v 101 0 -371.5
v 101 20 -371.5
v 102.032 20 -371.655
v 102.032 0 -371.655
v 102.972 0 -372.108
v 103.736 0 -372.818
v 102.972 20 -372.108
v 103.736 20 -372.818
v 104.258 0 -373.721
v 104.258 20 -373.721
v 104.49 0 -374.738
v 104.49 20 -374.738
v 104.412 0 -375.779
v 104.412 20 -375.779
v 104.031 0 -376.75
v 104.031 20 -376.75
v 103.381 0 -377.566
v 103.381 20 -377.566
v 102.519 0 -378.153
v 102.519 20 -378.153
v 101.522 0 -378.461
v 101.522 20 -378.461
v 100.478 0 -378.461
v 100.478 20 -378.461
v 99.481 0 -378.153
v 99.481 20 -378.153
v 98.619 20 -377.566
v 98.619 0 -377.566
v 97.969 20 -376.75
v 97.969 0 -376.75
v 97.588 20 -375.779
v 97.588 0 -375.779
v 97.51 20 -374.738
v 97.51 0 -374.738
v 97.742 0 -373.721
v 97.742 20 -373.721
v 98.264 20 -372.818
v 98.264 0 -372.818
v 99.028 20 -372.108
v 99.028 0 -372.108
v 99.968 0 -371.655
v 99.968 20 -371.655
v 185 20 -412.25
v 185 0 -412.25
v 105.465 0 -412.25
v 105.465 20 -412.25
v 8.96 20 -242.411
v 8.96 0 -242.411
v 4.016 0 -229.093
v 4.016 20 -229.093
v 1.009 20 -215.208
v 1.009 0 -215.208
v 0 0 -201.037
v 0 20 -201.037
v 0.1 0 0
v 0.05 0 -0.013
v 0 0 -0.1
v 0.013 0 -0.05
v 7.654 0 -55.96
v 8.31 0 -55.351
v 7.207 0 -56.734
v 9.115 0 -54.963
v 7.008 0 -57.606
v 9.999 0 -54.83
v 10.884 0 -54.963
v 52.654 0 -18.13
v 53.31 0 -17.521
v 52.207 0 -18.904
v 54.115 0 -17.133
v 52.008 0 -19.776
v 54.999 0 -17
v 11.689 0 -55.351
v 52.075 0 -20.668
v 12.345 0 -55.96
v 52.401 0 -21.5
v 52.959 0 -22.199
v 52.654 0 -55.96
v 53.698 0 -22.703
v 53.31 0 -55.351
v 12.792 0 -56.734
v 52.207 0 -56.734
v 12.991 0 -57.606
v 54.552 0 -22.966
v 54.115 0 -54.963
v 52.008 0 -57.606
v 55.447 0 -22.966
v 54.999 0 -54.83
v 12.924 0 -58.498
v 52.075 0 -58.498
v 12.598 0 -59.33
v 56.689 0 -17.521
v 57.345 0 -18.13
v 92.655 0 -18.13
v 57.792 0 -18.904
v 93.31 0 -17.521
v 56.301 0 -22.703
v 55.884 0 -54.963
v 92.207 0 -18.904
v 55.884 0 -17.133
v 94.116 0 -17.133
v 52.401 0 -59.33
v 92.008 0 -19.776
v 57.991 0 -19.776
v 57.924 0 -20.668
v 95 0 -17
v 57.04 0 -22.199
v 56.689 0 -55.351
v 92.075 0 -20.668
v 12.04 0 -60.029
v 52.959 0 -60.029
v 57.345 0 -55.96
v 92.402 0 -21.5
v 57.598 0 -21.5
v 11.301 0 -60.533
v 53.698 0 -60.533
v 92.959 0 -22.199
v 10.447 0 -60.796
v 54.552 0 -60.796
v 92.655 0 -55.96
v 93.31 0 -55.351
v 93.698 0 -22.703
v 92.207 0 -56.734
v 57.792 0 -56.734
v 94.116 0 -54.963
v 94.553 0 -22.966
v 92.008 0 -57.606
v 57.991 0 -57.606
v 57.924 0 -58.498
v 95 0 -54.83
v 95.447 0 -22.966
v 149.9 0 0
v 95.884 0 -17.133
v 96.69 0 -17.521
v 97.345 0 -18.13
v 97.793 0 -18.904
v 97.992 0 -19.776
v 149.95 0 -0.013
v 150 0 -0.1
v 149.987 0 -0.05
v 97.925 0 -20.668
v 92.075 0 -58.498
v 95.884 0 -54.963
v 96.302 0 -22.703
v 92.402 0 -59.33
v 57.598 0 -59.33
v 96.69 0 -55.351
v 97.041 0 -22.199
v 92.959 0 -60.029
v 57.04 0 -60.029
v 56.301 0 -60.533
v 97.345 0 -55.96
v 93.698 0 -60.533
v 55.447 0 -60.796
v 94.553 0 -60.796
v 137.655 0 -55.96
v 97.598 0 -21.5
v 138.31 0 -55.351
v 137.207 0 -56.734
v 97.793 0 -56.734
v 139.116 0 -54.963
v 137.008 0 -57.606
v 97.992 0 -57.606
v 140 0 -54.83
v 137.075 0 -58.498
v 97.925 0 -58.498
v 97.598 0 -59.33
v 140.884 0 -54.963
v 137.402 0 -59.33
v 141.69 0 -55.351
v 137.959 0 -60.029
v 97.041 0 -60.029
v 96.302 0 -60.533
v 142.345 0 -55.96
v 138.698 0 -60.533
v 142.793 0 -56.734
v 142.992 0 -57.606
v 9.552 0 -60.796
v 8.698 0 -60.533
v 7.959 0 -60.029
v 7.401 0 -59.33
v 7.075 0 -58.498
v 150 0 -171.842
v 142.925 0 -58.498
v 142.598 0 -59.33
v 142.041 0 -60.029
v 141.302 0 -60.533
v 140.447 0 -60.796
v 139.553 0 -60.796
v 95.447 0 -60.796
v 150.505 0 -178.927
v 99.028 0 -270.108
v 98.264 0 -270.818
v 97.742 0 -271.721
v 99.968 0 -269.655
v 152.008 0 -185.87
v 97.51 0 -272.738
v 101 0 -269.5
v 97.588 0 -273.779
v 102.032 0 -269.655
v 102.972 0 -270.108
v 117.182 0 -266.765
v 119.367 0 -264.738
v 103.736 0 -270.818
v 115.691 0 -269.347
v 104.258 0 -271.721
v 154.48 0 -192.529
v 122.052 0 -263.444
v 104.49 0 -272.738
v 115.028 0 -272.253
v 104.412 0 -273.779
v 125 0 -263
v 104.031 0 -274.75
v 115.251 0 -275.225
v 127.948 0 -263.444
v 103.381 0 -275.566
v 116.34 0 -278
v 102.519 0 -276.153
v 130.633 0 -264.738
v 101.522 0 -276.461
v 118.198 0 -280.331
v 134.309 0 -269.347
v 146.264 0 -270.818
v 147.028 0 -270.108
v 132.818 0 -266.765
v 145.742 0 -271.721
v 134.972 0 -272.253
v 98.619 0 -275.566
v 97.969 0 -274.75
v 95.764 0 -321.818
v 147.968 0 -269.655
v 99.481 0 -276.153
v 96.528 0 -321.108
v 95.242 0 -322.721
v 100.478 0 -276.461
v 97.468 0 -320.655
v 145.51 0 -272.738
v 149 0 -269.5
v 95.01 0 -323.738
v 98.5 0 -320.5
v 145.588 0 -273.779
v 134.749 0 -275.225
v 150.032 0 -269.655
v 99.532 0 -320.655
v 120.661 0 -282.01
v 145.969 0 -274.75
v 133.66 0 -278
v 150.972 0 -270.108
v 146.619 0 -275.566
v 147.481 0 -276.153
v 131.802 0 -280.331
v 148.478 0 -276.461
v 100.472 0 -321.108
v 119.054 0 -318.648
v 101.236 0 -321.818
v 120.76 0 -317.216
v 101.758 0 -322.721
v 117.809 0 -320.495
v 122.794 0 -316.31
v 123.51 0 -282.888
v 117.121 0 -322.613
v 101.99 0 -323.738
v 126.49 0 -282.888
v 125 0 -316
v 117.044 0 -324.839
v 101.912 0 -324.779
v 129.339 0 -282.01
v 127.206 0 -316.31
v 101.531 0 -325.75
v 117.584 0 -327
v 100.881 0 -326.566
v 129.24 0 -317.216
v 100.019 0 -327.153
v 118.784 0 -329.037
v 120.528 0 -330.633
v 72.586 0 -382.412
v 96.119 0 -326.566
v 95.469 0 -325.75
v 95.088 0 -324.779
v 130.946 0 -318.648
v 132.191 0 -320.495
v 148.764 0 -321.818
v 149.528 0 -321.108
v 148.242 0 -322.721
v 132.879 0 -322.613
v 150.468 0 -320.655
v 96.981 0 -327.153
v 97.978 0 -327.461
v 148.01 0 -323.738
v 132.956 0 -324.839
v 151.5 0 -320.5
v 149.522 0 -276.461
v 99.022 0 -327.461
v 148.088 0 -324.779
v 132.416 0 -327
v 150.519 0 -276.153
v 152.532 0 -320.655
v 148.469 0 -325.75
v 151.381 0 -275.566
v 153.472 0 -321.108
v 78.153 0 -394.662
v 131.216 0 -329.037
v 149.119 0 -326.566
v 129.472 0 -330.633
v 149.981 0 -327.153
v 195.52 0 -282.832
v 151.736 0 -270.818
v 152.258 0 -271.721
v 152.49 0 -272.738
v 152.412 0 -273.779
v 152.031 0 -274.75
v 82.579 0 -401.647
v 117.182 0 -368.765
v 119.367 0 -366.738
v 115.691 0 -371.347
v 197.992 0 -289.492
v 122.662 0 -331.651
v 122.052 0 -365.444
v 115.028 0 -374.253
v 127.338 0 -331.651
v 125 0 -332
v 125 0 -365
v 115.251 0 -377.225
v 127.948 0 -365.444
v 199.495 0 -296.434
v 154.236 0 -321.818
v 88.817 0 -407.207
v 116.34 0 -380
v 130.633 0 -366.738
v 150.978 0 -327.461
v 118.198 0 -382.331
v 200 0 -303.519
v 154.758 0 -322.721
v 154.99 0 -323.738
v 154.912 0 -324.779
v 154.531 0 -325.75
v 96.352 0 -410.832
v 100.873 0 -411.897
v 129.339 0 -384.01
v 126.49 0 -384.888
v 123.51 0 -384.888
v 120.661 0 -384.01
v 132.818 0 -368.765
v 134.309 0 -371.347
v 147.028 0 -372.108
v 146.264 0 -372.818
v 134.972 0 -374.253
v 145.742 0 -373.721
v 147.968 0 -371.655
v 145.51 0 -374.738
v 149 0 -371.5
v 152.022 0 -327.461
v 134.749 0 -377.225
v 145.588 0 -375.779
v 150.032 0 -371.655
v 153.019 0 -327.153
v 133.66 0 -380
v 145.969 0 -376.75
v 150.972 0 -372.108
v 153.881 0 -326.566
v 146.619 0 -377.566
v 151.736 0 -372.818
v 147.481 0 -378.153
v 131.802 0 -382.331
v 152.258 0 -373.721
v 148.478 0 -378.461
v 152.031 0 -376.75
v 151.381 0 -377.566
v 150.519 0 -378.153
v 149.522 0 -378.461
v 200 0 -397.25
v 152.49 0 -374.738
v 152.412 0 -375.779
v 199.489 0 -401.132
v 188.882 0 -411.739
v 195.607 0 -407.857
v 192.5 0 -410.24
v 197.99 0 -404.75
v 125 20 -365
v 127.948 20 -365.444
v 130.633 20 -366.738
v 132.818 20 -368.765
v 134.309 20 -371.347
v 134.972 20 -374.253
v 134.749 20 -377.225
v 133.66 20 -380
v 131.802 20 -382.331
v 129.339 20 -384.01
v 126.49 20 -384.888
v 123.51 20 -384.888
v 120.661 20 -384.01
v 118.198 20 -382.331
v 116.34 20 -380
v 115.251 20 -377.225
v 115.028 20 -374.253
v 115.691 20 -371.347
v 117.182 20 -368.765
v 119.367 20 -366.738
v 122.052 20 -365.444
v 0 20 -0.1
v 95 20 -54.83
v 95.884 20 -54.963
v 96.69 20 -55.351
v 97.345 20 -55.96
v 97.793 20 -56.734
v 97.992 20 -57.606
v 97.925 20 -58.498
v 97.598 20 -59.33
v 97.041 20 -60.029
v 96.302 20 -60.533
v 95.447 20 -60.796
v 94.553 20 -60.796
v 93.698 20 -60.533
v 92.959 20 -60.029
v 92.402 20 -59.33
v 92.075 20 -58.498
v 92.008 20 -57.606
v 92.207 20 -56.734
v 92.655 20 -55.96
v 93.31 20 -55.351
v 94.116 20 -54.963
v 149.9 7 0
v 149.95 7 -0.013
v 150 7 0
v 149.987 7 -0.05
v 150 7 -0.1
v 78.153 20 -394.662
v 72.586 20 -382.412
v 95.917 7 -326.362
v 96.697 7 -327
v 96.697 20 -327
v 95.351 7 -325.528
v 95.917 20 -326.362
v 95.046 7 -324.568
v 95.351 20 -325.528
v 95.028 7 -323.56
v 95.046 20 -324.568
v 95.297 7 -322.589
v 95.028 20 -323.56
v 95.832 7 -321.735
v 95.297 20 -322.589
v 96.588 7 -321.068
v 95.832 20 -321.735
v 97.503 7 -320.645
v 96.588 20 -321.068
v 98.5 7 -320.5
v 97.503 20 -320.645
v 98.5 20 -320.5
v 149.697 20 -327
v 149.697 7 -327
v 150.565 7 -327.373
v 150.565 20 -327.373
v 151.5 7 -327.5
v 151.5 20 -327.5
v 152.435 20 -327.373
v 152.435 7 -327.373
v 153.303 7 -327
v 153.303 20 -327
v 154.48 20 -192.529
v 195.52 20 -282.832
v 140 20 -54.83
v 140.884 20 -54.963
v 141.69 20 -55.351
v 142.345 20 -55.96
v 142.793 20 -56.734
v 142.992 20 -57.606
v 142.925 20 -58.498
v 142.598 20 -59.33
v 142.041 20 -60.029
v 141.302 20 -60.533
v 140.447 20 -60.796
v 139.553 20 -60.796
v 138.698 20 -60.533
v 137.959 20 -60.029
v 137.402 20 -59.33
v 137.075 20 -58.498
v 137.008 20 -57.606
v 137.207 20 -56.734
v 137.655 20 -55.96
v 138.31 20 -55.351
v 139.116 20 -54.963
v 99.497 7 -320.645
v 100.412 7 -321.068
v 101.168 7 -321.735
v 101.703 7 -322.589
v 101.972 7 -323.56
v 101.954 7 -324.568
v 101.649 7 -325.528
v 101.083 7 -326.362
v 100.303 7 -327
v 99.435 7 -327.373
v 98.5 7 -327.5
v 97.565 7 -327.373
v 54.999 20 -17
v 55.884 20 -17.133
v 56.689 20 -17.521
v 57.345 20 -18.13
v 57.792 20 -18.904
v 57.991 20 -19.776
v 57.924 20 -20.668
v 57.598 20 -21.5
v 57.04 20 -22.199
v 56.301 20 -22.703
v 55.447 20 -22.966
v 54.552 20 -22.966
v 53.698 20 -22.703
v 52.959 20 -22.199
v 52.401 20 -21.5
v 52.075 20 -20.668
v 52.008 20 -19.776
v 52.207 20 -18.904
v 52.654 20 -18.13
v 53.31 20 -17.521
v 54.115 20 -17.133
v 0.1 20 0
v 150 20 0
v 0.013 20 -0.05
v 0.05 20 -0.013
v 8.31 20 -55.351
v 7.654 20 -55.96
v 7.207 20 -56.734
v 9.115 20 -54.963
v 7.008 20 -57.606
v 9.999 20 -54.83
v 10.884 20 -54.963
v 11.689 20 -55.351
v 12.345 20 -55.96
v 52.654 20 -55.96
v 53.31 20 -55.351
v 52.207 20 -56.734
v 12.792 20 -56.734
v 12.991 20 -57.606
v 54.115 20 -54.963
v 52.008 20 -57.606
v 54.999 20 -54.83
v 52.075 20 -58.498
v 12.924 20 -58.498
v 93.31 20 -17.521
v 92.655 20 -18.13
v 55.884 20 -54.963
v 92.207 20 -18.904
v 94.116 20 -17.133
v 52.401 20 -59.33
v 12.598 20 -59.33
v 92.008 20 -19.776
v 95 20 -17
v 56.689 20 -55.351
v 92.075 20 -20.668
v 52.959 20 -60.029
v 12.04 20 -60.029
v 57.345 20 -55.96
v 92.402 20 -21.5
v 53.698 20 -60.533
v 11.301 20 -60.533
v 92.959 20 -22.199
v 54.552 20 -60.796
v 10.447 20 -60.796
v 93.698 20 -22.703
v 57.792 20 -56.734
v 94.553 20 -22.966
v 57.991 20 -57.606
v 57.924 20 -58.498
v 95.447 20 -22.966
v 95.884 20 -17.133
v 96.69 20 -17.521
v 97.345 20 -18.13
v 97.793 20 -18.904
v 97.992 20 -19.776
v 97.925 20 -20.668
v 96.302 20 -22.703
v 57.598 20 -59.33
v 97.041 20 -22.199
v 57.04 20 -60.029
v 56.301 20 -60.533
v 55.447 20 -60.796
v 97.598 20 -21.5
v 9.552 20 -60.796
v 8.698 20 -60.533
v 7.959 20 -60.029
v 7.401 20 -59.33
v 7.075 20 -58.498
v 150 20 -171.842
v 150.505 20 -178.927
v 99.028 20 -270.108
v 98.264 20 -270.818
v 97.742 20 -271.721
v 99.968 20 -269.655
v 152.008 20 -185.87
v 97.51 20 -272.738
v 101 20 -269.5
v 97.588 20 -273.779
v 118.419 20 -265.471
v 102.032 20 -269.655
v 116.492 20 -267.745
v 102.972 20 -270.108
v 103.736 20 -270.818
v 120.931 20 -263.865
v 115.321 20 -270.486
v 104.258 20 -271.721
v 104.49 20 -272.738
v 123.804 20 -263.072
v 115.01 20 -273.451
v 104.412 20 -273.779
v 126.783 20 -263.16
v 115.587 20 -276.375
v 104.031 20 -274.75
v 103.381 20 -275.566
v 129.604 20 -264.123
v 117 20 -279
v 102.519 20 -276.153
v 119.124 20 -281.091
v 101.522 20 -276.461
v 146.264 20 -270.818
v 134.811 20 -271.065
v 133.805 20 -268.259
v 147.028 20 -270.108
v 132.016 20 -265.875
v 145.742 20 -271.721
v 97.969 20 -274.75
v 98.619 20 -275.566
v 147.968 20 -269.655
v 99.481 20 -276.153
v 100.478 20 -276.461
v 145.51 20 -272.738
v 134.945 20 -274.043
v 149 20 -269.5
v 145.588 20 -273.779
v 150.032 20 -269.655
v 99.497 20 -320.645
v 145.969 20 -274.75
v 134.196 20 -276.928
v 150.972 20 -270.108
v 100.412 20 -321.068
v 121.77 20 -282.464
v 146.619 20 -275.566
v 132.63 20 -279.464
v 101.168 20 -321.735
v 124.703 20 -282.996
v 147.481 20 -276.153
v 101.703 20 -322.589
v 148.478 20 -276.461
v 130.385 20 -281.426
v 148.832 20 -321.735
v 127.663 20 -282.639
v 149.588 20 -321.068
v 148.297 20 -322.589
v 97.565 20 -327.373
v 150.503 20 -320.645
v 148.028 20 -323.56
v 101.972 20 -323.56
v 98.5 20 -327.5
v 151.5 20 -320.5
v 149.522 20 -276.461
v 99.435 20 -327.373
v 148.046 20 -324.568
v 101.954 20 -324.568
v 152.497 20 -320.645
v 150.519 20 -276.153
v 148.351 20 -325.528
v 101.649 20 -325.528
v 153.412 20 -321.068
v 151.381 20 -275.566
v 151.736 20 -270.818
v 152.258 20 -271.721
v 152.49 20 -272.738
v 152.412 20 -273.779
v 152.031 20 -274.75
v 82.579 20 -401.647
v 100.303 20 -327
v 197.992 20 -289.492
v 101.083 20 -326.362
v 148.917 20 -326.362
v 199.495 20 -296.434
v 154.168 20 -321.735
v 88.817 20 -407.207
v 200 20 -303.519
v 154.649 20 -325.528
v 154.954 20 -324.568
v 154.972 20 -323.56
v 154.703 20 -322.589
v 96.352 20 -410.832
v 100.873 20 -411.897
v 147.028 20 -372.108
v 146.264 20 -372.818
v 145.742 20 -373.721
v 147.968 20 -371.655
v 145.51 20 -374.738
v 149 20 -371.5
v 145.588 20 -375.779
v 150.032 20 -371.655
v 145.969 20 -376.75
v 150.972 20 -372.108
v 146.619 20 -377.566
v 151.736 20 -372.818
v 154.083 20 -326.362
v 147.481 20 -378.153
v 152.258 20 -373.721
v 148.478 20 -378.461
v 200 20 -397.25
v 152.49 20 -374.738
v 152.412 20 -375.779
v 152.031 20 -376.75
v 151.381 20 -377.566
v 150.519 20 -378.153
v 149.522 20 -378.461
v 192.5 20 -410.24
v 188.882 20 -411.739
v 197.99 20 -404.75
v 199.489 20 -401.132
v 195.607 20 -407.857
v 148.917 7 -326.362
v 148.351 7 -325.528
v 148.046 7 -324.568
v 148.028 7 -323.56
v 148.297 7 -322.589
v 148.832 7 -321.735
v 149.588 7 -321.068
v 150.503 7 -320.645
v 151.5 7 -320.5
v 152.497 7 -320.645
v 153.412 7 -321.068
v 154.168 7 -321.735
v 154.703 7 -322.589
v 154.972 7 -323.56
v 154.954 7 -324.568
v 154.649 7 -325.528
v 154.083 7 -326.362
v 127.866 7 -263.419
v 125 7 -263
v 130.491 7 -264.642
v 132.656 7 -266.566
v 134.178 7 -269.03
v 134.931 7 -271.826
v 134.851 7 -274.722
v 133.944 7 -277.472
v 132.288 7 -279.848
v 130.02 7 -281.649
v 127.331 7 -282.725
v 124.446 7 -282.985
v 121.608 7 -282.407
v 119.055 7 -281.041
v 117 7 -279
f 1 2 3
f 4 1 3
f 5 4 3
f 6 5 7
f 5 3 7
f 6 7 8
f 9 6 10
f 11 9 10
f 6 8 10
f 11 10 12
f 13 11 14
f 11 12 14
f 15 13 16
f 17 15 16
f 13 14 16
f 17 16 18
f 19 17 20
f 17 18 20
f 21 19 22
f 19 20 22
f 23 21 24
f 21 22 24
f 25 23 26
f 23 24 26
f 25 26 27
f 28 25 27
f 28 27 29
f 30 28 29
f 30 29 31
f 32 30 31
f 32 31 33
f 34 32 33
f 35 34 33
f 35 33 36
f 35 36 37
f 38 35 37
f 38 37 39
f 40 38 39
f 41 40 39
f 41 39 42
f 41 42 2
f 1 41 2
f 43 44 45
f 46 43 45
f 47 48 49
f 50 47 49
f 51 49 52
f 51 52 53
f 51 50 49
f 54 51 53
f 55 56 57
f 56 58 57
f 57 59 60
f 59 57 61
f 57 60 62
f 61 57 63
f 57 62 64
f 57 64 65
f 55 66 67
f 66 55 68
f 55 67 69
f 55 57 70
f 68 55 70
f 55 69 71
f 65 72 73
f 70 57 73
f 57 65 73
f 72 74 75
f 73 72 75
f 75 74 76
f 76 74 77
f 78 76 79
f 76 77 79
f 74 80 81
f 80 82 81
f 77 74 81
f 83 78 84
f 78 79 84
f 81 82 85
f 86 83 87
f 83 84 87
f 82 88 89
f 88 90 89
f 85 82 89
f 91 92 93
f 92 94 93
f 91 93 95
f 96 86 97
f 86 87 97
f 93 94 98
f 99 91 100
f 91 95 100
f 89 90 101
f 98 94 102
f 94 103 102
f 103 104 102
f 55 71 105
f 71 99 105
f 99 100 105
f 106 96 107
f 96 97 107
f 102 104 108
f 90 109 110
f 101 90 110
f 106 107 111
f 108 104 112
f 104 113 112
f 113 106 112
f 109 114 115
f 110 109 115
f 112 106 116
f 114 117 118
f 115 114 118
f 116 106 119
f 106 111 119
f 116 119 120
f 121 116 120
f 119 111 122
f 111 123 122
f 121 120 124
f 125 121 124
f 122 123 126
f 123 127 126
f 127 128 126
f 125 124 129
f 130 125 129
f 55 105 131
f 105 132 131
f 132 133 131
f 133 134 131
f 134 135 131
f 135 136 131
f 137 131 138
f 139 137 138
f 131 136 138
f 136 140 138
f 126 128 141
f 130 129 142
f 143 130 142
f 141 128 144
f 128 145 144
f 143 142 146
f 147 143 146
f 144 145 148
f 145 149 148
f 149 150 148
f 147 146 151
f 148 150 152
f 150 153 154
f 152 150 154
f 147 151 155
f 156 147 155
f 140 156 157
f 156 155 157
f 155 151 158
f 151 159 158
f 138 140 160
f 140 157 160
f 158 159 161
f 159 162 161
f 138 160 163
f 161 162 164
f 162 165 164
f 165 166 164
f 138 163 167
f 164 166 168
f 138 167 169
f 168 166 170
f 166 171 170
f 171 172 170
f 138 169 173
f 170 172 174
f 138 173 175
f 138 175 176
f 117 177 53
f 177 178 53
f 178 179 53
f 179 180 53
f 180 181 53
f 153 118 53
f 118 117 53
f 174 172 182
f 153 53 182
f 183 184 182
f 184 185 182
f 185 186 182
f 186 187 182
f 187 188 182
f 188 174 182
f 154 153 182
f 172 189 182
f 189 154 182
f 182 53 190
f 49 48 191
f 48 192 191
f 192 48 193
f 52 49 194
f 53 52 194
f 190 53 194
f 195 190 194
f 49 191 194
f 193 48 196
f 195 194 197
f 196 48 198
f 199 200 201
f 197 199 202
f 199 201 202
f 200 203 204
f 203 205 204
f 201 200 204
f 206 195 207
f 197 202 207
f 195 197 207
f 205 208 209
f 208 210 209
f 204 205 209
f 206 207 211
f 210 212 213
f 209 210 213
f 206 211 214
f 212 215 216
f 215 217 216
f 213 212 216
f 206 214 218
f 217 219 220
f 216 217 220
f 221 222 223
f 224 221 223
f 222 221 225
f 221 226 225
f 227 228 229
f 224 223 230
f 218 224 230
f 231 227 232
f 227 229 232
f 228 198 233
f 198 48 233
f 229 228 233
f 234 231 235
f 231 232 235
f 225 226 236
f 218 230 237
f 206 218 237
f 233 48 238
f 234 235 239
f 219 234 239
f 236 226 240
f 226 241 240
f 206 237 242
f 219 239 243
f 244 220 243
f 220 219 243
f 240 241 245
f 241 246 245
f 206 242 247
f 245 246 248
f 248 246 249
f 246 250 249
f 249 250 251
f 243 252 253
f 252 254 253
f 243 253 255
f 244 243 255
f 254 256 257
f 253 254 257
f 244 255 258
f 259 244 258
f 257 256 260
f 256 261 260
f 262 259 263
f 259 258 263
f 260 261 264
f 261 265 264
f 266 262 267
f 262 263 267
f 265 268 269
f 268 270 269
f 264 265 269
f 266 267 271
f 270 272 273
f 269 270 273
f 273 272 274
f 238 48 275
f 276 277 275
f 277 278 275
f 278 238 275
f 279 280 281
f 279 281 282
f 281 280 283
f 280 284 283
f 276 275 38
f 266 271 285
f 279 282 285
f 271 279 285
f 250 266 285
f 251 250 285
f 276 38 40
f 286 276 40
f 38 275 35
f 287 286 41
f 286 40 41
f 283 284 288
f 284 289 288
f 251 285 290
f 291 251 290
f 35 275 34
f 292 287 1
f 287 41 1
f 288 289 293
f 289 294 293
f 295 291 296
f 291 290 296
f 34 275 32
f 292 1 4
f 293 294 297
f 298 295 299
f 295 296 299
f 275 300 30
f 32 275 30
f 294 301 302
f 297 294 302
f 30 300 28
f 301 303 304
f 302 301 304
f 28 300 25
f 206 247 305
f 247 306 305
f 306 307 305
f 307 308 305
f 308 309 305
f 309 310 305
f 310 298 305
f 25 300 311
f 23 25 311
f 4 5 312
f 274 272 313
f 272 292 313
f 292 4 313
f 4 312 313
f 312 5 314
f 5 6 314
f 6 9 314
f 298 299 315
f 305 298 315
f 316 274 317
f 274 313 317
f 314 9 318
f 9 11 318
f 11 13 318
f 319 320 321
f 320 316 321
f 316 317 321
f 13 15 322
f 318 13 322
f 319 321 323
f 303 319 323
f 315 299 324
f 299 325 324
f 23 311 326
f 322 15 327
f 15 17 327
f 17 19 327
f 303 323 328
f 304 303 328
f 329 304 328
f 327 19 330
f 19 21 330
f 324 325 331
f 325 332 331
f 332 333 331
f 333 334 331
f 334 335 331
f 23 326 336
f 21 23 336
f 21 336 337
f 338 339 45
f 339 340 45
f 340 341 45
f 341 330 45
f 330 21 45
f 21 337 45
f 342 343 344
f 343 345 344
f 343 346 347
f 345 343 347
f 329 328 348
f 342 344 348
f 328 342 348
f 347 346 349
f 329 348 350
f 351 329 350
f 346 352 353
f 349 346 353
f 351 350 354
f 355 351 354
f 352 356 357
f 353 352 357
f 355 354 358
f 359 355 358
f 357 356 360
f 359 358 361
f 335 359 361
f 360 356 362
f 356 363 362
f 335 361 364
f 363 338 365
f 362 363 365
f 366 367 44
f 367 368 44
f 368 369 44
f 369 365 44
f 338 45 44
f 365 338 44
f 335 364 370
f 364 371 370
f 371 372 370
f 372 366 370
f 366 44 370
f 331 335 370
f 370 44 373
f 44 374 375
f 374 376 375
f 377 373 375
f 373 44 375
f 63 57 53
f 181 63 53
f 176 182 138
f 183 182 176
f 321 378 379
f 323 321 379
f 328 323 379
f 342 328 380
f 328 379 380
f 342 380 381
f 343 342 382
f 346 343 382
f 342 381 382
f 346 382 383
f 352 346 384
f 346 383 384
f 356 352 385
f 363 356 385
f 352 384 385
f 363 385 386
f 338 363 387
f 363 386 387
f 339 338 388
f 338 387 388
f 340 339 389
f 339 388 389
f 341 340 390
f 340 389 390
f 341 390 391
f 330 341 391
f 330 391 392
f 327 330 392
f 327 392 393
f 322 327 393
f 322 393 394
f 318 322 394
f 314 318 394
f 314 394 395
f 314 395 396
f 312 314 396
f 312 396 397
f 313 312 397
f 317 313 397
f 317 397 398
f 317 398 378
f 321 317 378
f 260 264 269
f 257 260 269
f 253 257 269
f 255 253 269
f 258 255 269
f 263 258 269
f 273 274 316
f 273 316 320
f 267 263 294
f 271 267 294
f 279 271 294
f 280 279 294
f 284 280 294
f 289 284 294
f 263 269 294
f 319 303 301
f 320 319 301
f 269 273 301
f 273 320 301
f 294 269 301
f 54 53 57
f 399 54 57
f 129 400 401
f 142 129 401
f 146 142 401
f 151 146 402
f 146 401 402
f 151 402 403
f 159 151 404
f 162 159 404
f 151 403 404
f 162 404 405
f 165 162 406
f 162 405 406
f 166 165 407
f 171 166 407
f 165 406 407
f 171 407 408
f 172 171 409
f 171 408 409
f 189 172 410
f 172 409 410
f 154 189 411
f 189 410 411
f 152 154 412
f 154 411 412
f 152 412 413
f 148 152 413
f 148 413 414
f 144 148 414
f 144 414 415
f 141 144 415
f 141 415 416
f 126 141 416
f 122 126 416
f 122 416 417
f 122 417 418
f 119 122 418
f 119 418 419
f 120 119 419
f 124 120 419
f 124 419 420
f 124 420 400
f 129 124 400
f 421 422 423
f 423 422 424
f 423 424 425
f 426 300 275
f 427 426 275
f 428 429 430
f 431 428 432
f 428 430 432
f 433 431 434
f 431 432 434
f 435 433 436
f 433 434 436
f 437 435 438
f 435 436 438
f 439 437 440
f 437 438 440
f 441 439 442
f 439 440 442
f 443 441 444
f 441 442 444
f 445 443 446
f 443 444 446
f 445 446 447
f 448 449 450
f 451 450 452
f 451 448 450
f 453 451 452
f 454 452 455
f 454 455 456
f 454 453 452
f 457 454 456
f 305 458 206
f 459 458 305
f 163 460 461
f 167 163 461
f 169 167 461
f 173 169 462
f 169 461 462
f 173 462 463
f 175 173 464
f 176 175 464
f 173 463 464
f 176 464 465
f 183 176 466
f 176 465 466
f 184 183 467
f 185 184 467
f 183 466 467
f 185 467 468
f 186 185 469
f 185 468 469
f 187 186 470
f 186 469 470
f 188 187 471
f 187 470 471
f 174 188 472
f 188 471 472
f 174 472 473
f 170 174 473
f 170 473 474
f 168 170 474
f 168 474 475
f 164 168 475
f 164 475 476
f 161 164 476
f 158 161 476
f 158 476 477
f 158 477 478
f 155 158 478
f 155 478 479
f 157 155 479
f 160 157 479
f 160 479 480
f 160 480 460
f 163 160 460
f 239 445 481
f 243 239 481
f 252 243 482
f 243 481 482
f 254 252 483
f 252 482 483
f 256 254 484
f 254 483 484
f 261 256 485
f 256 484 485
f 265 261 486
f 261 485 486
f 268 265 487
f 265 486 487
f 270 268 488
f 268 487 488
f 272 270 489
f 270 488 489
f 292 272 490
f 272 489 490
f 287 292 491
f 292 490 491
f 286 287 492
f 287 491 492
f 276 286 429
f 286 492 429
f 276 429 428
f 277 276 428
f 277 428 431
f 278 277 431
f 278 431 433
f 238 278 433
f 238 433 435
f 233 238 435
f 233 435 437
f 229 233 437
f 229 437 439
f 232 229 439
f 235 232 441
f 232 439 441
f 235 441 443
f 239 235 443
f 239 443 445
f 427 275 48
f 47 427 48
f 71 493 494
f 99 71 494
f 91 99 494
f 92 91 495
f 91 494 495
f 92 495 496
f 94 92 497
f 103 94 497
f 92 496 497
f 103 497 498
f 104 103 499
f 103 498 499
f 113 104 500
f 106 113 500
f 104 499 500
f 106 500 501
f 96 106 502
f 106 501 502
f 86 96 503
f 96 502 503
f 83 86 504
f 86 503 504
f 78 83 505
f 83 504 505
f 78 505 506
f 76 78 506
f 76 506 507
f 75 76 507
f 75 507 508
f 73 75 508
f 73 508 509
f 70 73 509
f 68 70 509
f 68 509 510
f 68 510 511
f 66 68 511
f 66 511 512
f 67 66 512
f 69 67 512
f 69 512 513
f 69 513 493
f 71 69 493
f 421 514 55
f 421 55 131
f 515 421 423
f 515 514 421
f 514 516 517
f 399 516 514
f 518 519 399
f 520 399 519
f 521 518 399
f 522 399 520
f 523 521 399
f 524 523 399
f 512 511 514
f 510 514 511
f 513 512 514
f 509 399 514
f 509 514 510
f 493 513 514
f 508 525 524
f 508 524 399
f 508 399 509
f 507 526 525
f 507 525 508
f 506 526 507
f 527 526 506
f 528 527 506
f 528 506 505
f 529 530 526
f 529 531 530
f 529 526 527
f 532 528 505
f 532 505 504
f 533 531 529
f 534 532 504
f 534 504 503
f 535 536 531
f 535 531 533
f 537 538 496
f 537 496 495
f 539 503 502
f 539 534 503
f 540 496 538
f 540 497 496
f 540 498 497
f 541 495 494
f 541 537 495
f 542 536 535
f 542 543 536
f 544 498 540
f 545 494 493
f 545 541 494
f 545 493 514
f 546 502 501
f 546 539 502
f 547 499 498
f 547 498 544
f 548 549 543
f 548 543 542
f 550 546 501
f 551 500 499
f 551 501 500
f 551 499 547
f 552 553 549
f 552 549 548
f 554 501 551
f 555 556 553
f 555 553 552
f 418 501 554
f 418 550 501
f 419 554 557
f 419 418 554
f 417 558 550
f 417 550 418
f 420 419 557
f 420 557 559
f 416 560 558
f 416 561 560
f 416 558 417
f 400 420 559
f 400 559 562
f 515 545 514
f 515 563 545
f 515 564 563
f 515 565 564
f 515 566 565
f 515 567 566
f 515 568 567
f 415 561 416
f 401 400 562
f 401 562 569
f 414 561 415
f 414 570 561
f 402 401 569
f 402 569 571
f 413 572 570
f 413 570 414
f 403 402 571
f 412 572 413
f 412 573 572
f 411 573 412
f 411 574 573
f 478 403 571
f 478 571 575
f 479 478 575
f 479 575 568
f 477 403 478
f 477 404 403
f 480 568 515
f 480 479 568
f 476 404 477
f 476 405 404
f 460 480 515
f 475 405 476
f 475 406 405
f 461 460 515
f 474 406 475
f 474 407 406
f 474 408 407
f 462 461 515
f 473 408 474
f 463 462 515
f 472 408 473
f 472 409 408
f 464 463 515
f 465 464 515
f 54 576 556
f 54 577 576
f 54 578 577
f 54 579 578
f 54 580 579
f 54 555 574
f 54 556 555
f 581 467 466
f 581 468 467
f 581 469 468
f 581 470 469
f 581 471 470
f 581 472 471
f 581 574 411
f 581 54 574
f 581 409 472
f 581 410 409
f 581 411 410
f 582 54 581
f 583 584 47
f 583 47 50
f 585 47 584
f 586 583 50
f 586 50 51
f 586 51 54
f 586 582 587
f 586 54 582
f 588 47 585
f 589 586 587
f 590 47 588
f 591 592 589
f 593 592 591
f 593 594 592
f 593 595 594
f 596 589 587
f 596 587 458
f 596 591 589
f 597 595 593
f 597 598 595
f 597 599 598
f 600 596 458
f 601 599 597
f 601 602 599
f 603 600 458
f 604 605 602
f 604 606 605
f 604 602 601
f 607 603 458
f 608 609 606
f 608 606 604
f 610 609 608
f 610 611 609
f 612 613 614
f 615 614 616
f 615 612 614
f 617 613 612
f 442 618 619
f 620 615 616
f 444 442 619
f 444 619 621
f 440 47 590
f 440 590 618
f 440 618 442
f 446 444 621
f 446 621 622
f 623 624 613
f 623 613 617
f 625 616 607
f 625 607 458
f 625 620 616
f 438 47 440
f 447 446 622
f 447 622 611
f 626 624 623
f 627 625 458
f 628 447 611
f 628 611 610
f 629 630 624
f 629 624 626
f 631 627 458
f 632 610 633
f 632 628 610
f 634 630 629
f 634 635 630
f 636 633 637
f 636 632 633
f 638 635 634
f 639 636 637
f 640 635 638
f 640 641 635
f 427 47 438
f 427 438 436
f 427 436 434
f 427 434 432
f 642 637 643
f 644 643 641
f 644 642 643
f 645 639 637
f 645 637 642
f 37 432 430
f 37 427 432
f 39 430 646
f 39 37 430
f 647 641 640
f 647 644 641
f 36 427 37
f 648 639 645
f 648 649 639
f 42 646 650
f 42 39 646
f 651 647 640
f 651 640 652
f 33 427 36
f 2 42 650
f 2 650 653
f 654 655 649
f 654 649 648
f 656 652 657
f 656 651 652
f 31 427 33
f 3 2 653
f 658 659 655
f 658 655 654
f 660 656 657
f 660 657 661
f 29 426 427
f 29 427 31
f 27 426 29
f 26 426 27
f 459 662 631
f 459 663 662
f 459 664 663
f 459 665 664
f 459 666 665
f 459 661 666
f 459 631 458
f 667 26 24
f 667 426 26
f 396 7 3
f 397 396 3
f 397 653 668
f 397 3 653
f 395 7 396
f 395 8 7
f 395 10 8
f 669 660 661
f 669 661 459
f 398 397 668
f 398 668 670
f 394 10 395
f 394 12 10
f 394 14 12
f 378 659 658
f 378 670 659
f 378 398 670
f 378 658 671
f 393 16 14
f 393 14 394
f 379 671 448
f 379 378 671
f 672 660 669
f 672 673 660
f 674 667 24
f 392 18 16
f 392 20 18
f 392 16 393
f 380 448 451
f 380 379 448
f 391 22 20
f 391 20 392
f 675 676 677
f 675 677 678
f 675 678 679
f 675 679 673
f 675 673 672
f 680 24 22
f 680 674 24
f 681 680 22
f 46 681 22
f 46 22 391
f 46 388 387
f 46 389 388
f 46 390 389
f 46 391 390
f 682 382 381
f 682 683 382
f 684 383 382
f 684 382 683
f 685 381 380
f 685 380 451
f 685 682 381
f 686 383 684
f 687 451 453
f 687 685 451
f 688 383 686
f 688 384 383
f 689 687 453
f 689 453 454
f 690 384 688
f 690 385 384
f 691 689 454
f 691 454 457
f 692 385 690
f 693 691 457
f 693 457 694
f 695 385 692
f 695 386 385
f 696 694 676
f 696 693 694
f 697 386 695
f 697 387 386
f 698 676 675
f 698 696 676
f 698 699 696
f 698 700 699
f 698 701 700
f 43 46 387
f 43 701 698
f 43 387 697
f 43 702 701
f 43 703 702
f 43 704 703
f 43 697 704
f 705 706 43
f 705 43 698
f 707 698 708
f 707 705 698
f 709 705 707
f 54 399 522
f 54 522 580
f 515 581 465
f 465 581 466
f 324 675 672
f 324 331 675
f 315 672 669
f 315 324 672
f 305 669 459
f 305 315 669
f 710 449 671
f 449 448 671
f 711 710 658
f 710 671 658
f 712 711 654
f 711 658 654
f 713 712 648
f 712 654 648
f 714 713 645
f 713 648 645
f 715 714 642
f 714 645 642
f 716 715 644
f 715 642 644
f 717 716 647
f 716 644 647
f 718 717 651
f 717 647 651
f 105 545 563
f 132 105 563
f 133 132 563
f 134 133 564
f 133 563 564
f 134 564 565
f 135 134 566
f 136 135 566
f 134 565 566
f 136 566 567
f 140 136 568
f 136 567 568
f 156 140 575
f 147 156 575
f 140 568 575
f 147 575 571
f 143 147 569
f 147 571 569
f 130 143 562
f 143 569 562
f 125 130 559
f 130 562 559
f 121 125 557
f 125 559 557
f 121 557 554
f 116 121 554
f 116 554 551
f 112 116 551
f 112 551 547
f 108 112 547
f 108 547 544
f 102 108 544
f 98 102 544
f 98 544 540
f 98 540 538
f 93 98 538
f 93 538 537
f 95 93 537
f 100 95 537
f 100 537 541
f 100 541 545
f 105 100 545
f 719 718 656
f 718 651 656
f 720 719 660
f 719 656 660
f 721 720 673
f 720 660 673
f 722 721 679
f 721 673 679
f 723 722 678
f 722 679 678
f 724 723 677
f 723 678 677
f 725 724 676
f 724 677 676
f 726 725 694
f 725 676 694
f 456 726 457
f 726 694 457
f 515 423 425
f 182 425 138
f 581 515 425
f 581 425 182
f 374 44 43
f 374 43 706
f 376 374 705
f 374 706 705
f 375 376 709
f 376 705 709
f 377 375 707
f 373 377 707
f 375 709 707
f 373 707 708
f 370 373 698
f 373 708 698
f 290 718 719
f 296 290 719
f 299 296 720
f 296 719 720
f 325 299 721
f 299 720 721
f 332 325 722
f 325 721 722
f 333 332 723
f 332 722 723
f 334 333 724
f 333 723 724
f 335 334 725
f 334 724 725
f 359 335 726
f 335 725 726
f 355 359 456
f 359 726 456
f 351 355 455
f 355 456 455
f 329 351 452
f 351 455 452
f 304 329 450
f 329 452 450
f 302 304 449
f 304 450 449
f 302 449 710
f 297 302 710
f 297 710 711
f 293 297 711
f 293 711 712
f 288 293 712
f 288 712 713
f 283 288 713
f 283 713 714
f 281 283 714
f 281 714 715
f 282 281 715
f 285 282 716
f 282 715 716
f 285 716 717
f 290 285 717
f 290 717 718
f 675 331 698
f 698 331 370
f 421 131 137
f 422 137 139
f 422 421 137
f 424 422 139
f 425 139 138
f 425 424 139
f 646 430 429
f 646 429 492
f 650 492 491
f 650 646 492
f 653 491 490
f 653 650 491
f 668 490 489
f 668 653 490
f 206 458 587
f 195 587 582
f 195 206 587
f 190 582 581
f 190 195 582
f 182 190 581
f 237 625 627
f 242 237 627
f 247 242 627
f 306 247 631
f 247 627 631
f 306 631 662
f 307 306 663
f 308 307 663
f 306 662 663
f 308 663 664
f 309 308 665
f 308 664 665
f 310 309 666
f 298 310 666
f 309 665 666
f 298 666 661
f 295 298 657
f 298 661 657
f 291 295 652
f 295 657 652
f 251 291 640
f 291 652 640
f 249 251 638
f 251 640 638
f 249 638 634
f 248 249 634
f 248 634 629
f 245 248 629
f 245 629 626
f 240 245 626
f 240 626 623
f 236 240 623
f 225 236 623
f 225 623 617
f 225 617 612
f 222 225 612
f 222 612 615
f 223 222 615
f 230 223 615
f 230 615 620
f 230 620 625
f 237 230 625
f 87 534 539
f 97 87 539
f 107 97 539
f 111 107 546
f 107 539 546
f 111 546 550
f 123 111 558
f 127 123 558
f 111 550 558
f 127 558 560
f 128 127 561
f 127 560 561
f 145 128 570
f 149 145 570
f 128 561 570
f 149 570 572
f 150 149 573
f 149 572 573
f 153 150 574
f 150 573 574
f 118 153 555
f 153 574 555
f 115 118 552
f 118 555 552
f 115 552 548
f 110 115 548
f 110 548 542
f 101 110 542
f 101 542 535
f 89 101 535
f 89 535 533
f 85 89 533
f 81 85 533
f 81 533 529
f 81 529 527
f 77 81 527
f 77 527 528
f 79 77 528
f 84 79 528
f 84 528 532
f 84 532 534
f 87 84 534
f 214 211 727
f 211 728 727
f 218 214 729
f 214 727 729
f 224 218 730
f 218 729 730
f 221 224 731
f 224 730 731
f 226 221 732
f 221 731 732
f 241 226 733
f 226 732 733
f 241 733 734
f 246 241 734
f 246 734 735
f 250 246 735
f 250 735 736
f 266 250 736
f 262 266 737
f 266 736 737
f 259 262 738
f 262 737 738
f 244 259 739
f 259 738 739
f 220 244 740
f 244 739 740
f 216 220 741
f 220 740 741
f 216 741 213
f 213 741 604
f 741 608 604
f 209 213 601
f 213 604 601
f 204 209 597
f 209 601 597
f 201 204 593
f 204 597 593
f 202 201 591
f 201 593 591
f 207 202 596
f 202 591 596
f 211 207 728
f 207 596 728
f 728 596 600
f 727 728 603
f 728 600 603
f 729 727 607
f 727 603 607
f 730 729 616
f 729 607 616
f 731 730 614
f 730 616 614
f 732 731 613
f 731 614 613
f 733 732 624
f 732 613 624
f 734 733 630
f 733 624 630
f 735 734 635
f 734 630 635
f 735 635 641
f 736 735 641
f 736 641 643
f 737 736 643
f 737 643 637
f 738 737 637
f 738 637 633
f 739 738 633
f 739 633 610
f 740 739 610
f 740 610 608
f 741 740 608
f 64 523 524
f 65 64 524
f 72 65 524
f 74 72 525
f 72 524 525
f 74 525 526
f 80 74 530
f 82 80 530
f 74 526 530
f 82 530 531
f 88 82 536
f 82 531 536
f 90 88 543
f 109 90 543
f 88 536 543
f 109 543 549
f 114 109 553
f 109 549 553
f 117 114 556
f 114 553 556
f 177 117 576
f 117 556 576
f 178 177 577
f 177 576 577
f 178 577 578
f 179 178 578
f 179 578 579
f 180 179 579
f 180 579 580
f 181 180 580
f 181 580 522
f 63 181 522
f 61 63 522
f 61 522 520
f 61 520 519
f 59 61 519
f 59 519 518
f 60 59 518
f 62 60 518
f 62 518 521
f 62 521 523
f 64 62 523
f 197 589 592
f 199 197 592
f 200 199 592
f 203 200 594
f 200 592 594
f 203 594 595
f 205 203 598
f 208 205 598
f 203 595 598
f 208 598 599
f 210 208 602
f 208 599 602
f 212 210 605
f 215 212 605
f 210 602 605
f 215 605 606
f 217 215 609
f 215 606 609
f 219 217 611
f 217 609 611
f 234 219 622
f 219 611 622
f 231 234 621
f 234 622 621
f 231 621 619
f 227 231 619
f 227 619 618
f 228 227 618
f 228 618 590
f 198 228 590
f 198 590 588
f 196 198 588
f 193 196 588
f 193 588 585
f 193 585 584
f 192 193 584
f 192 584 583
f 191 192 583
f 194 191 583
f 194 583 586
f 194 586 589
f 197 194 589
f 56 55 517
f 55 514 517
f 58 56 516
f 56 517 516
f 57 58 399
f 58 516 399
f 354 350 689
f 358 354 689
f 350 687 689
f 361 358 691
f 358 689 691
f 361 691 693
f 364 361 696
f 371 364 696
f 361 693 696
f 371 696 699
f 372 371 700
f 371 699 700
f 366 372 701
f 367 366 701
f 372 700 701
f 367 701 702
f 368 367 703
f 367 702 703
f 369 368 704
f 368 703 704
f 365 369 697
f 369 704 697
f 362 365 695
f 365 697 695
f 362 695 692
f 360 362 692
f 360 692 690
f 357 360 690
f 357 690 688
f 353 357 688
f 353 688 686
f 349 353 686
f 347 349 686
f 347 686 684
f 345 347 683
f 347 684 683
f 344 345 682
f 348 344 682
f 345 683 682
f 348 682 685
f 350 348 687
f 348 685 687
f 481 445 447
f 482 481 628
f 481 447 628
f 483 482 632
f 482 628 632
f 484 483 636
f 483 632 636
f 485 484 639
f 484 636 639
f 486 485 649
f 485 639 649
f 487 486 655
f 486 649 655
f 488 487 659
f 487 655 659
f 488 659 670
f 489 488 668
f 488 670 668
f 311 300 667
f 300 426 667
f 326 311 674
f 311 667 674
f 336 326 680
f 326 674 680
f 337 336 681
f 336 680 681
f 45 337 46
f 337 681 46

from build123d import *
from build123d.topology import SkipClean

# Parameters (mm, degrees)
BOSS_EXTRUDE1_DEPTH  = 20
FILLET1_R            = 15
FILLET3_R            = 30
FILLET4_R            = 100
CUT_EXTRUDE1_DEPTH   = 20
FILLET6_R            = 50
FILLET7_R            = 50
FILLET9_R            = 0.1
FILLET10_R           = 0.1
SKETCH3_R            = 3
CUT_EXTRUDE2_DEPTH   = 13
SKETCH4_R            = 8
SKETCH4_R_2          = 10
CUT_EXTRUDE3_DEPTH   = 30
SKETCH5_R            = 3.5
CUT_EXTRUDE4_DEPTH   = 13
SKETCH6_R            = 3.5
CUT_EXTRUDE5_DEPTH   = 13
SKETCH7_R            = 3
BOSS_EXTRUDE2_DEPTH  = 13
SKETCH8_R            = 3
BOSS_EXTRUDE3_DEPTH  = 13
SKETCH9_R            = 8
SKETCH9_R_2          = 3.5
SKETCH9_R_3          = 10
CUT_EXTRUDE6_DEPTH   = 13
SKETCH10_R           = 3.5
BOSS_EXTRUDE4_DEPTH  = 13
SKETCH12_W           = 149.9
SKETCH12_H           = 13
CUT_EXTRUDE9_DEPTH   = 70
SKETCH13_R           = 3
CUT_EXTRUDE12_DEPTH  = 60
SKETCH16_R           = 8
SKETCH16_R_2         = 3.5
SKETCH16_R_3         = 10
CUT_EXTRUDE14_DEPTH  = 60
BOSS_EXTRUDE5_START  = -7
BOSS_EXTRUDE5_DEPTH  = 7
SKETCH18_W           = 85.102461965
SKETCH18_H           = 20
BOSS_EXTRUDE6_DEPTH  = 2.25
BOSS_EXTRUDE7_DEPTH  = 20
FILLET11_R           = 30
FILLET12_R           = 15
BOSS_EXTRUDE9_START  = -20
BOSS_EXTRUDE9_DEPTH  = 20
FILLET13_R           = 30
FILLET14_R           = 15
SKETCH21_R           = 8
BOSS_EXTRUDE10_DEPTH = 20


with BuildPart() as part:
    # Sketch1 → Boss-Extrude1 (new body)
    with BuildSketch(Plane(origin=(0, 0, 0), x_dir=(1, 0, 0), z_dir=(0, 1, 0))):
        Polygon((0, 0), (150, 0), (150, 150), (200, 260), (200, 400), (80.578675248, 400), (0, 222.694428273), align=None)
    extrude(amount=BOSS_EXTRUDE1_DEPTH)

    # Fillet1
    fillet1_edges = [part.edges().sort_by_distance(p)[0] for p in [
        (200, 10, -400),
    ]]
    fillet(fillet1_edges, radius=FILLET1_R)

    # Fillet3
    fillet3_edges = [part.edges().sort_by_distance(p)[0] for p in [
        (80.578675248, 10, -400),
    ]]
    fillet(fillet3_edges, radius=FILLET3_R)

    # Fillet4
    fillet4_edges = [part.edges().sort_by_distance(p)[0] for p in [
        (0, 10, -222.694428273),
    ]]
    fillet(fillet4_edges, radius=FILLET4_R)

    # Sketch2 → Cut-Extrude1 (cut)
    with BuildSketch(Plane(origin=(0, 20, 0), x_dir=(1, 0, 0), z_dir=(0, 1, 0))):
        Polygon((150, 150), (150, 173.876585238), (150, 182.670606049), (200, 292.6907641), (200, 260), align=None)
    extrude(amount=-CUT_EXTRUDE1_DEPTH, mode=Mode.SUBTRACT)

    # Fillet6
    fillet6_edges = [part.edges().sort_by_distance(p)[0] for p in [
        (200, 10, -292.6907641),
    ]]
    fillet(fillet6_edges, radius=FILLET6_R)

    # Fillet7
    fillet7_edges = [part.edges().sort_by_distance(p)[0] for p in [
        (150, 10, -182.670606049),
    ]]
    fillet(fillet7_edges, radius=FILLET7_R)

    # Fillet9
    fillet9_edges = [part.edges().sort_by_distance(p)[0] for p in [
        (0, 10, 0),
    ]]
    fillet(fillet9_edges, radius=FILLET9_R)

    # Fillet10
    fillet10_edges = [part.edges().sort_by_distance(p)[0] for p in [
        (150, 10, 0),
    ]]
    fillet(fillet10_edges, radius=FILLET10_R)

    # Sketch3 → Cut-Extrude2 (cut)
    with BuildSketch(Plane(origin=(0, 20, 0), x_dir=(1, 0, 0), z_dir=(0, 1, 0))):
        with Locations(Location((10, 57.83, 0), (0, 0, 270))):
            Circle(SKETCH3_R)
        with Locations(Location((55, 57.83, 0), (0, 0, 270))):
            Circle(SKETCH3_R)
        with Locations(Location((55, 20, 0), (0, 0, 270))):
            Circle(SKETCH3_R)
        with Locations(Location((95, 57.83, 0), (0, 0, 270))):
            Circle(SKETCH3_R)
        with Locations(Location((140, 57.83, 0), (0, 0, 270))):
            Circle(SKETCH3_R)
        with Locations(Location((95, 20, 0), (0, 0, 270))):
            Circle(SKETCH3_R)
    extrude(amount=-CUT_EXTRUDE2_DEPTH, mode=Mode.SUBTRACT)

    # Sketch4 → Cut-Extrude3 (cut)
    with BuildSketch(Plane(origin=(0, 20, 0), x_dir=(1, 0, 0), z_dir=(0, 1, 0))):
        with Locations(Location((125, 330, 0), (0, 0, 270))):
            Circle(SKETCH4_R)
        with Locations(Location((125, 375, 0), (0, 0, 270))):
            Circle(SKETCH4_R_2)
        with Locations(Location((125, 285, 0), (0, 0, 270))):
            Circle(SKETCH4_R_2)
    extrude(amount=-CUT_EXTRUDE3_DEPTH, mode=Mode.SUBTRACT)

    # Sketch5 → Cut-Extrude4 (cut)
    with BuildSketch(Plane(origin=(0, 20, 0), x_dir=(1, 0, 0), z_dir=(0, 1, 0))):
        with Locations(Location((149, 375, 0), (0, 0, 270))):
            Circle(SKETCH5_R)
        with Locations(Location((101, 375, 0), (0, 0, 270))):
            Circle(SKETCH5_R)
        with Locations(Location((149, 285, 0), (0, 0, 270))):
            Circle(SKETCH5_R)
        with Locations(Location((101, 285, 0), (0, 0, 270))):
            Circle(SKETCH5_R)
    extrude(amount=-CUT_EXTRUDE4_DEPTH, mode=Mode.SUBTRACT)

    # Sketch6 → Cut-Extrude5 (cut)
    with BuildSketch(Plane(origin=(0, 20, 0), x_dir=(1, 0, 0), z_dir=(0, 1, 0))):
        with Locations(Location((151.5, 330, 0), (0, 0, 270))):
            Circle(SKETCH6_R)
        with Locations(Location((98.5, 330, 0), (0, 0, 270))):
            Circle(SKETCH6_R)
    extrude(amount=-CUT_EXTRUDE5_DEPTH, mode=Mode.SUBTRACT)

    # Sketch7 → Boss-Extrude2 (add)
    with BuildSketch(Plane(origin=(0, 20, 0), x_dir=(1, 0, 0), z_dir=(0, 1, 0))):
        with BuildLine():
            Line((149.9, 0), (0.1, 0))
            Line((0.1, 0), (0.1, -70))
            Line((0.1, -70), (39.581431097, -70))
            Line((39.581431097, -70), (55.1, -70))
            Line((55.1, -70), (150, -70))
            Line((150, -70), (150, 0.1))
            ThreePointArc((150, 0.1), (149.970710678, 0.029289322), (149.9, 0))
        make_face()
        with Locations(Location((10.1, -12.17, 0), (0, 0, 270))):
            Circle(SKETCH7_R, mode=Mode.SUBTRACT)
        with BuildLine():
            ThreePointArc((58.1, -50), (57.221320344, -52.121320344), (55.1, -53))
            ThreePointArc((55.1, -53), (52.1, -50), (55.1, -47))
            ThreePointArc((55.1, -47), (57.221320344, -47.878679656), (58.1, -50))
        make_face(mode=Mode.SUBTRACT)
        with BuildLine():
            ThreePointArc((58.1, -12.17), (57.221320344, -14.291320344), (55.1, -15.17))
            ThreePointArc((55.1, -15.17), (52.978679656, -14.291320344), (52.1, -12.17))
            ThreePointArc((52.1, -12.17), (55.1, -9.17), (58.1, -12.17))
        make_face(mode=Mode.SUBTRACT)
        with BuildLine():
            ThreePointArc((98.1, -50), (92.978679656, -52.121320344), (95.1, -47))
            ThreePointArc((95.1, -47), (97.221320344, -47.878679656), (98.1, -50))
        make_face(mode=Mode.SUBTRACT)
        with BuildLine():
            ThreePointArc((95.1, -15.17), (92.978679656, -14.291320344), (92.1, -12.17))
            ThreePointArc((92.1, -12.17), (95.1, -9.17), (98.1, -12.17))
            ThreePointArc((98.1, -12.17), (97.221320344, -14.291320344), (95.1, -15.17))
        make_face(mode=Mode.SUBTRACT)
        with BuildLine():
            ThreePointArc((143.1, -12.17), (140.1, -15.17), (137.1, -12.17))
            ThreePointArc((137.1, -12.17), (140.1, -9.17), (143.1, -12.17))
        make_face(mode=Mode.SUBTRACT)
    extrude(amount=-BOSS_EXTRUDE2_DEPTH)

    # Sketch8 → Boss-Extrude3 (add)
    with BuildSketch(Plane(origin=(0, 20, 0), x_dir=(1, 0, 0), z_dir=(0, 1, 0))):
        with Locations((10, 57.83)):
            Circle(SKETCH8_R)
        with Locations((55, 57.83)):
            Circle(SKETCH8_R)
        with Locations((95, 57.83)):
            Circle(SKETCH8_R)
        with Locations((140, 57.83)):
            Circle(SKETCH8_R)
        with Locations((95, 20)):
            Circle(SKETCH8_R)
        with Locations((55, 20)):
            Circle(SKETCH8_R)
    extrude(amount=-BOSS_EXTRUDE3_DEPTH)

    # Sketch9 → Cut-Extrude6 (cut)
    with BuildSketch(Plane(origin=(0, 20, 0), x_dir=(1, 0, 0), z_dir=(0, 1, 0))):
        with Locations((125, 324)):
            Circle(SKETCH9_R)
        with Locations((98.5, 324)):
            Circle(SKETCH9_R_2)
        with Locations((151.5, 324)):
            Circle(SKETCH9_R_2)
        with Locations(Location((101, 273, 0), (0, 0, 270))):
            Circle(SKETCH9_R_2)
        with Locations((125, 273)):
            Circle(SKETCH9_R_3)
        with Locations(Location((149, 273, 0), (0, 0, 270))):
            Circle(SKETCH9_R_2)
    extrude(amount=-CUT_EXTRUDE6_DEPTH, mode=Mode.SUBTRACT)

    # Sketch10 → Boss-Extrude4 (add)
    with BuildSketch(Plane(origin=(0, 20, 0), x_dir=(1, 0, 0), z_dir=(0, 1, 0))):
        with BuildLine():
            ThreePointArc((117.583801513, 327), (125, 332), (132.416198487, 327))
            ThreePointArc((132.416198487, 327), (132.85269342, 328.4718619), (133, 330))
            ThreePointArc((133, 330), (123.4718619, 337.85269342), (117.583801513, 327))
        make_face()
        with BuildLine():
            ThreePointArc((149.697224362, 327), (151.5, 327.5), (153.302775638, 327))
            ThreePointArc((153.302775638, 327), (154.546285831, 328.276589824), (155, 330))
            ThreePointArc((155, 330), (149.776589824, 333.046285831), (149.697224362, 327))
        make_face()
        with BuildLine():
            ThreePointArc((100.302775638, 327), (101.546285831, 328.276589824), (102, 330))
            ThreePointArc((102, 330), (96.776589824, 333.046285831), (96.697224362, 327))
            ThreePointArc((96.697224362, 327), (98.5, 327.5), (100.302775638, 327))
        make_face()
        with Locations((101, 285)):
            Circle(SKETCH10_R)
        with BuildLine():
            ThreePointArc((133, 279), (134.486832981, 281.83772234), (135, 285))
            ThreePointArc((135, 285), (121.83772234, 294.486832981), (117, 279))
            ThreePointArc((117, 279), (125, 283), (133, 279))
        make_face()
        with Locations((149, 285)):
            Circle(SKETCH10_R)
    extrude(amount=-BOSS_EXTRUDE4_DEPTH)

    # Sketch12 → Cut-Extrude9 (cut)
    with BuildSketch(Plane.XY.offset(70)):
        with Locations((75.05, 13.5)):
            Rectangle(SKETCH12_W, SKETCH12_H)
    extrude(amount=-CUT_EXTRUDE9_DEPTH, mode=Mode.SUBTRACT)

    # Sketch13 → Cut-Extrude12 (cut)
    with BuildSketch(Plane(origin=(0, 20, 0), x_dir=(1, 0, 0), z_dir=(0, 1, 0))):
        with Locations(Location((9.999499987, 57.83, 0), (0, 0, 270))):
            Circle(SKETCH13_R)
        with Locations(Location((54.999499987, 57.83, 0), (0, 0, 270))):
            Circle(SKETCH13_R)
        with Locations(Location((95, 57.83, 0), (0, 0, 270))):
            Circle(SKETCH13_R)
        with Locations(Location((140, 57.83, 0), (0, 0, 270))):
            Circle(SKETCH13_R)
        with Locations(Location((95, 20, 0), (0, 0, 270))):
            Circle(SKETCH13_R)
        with Locations(Location((54.999499987, 20, 0), (0, 0, 270))):
            Circle(SKETCH13_R)
    extrude(amount=-CUT_EXTRUDE12_DEPTH, mode=Mode.SUBTRACT)

    # Sketch16 → Cut-Extrude14 (cut)
    with BuildSketch(Plane(origin=(0, 20, 0), x_dir=(1, 0, 0), z_dir=(0, 1, 0))):
        with Locations(Location((125, 324, 0), (0, 0, 270))):
            Circle(SKETCH16_R)
        with Locations(Location((151.5, 324, 0), (0, 0, 270))):
            Circle(SKETCH16_R_2)
        with Locations(Location((101, 273, 0), (0, 0, 270))):
            Circle(SKETCH16_R_2)
        with Locations(Location((125, 273, 0), (0, 0, 270))):
            Circle(SKETCH16_R_3)
        with Locations(Location((149, 273, 0), (0, 0, 270))):
            Circle(SKETCH16_R_2)
        with Locations(Location((98.5, 324, 0), (0, 0, 270))):
            Circle(SKETCH16_R_2)
        with Locations(Location((101, 375, 0), (0, 0, 270))):
            Circle(SKETCH16_R_2)
        with Locations(Location((149, 375, 0), (0, 0, 270))):
            Circle(SKETCH16_R_2)
    extrude(amount=-CUT_EXTRUDE14_DEPTH, mode=Mode.SUBTRACT)

    # Sketch17 → Boss-Extrude5 (add)
    with SkipClean():  # the faces are left unmerged after this step: merging them gives an invalid solid
        with BuildSketch(Plane.XZ.offset(BOSS_EXTRUDE5_START)):
            with BuildLine():
                ThreePointArc((133, -279), (125, -283), (117, -279))
                ThreePointArc((117, -279), (121.83772234, -294.486832981), (135, -285))
                ThreePointArc((135, -285), (134.486832981, -281.83772234), (133, -279))
            make_face()
            with BuildLine():
                ThreePointArc((132.416198487, -327), (125, -332), (117.583801513, -327))
                ThreePointArc((117.583801513, -327), (123.4718619, -337.85269342), (133, -330))
                ThreePointArc((133, -330), (132.85269342, -328.4718619), (132.416198487, -327))
            make_face()
        extrude(amount=BOSS_EXTRUDE5_DEPTH)
    add(part.part.scale(1), mode=Mode.REPLACE)  # the faces are merged on a copy

    # Sketch18 → Boss-Extrude6 (add)
    with BuildSketch(Plane(origin=(0, 0, -400), x_dir=(-1, 0, 0), z_dir=(0, 0, -1))):
        with Locations((-142.448769018, 10)):
            Rectangle(SKETCH18_W, SKETCH18_H)
    extrude(amount=BOSS_EXTRUDE6_DEPTH)

    # Sketch19 → Boss-Extrude7 (add)
    with BuildSketch(Plane(origin=(0, 20, 0), x_dir=(1, 0, 0), z_dir=(0, 1, 0))):
        with BuildLine():
            Line((83.357981151, 402.25), (74.614259042, 386.147934958))
            ThreePointArc((74.614259042, 386.147934958), (85.482928236, 396.310055575), (99.897538035, 400))
            Line((99.897538035, 400), (99.897538035, 402.25))
            Line((99.897538035, 402.25), (83.357981151, 402.25))
        make_face()
        with BuildLine():
            Line((200, 385), (200, 402.25))
            Line((200, 402.25), (185, 402.25))
            Line((185, 402.25), (185, 400))
            ThreePointArc((185, 400), (195.606601718, 395.606601718), (200, 385))
        make_face()
    extrude(amount=-BOSS_EXTRUDE7_DEPTH)

    # Fillet11
    fillet11_edges = [part.edges().sort_by_distance(p)[0] for p in [
        (83.357981151, 10, -402.25),
    ]]
    fillet(fillet11_edges, radius=FILLET11_R)

    # Fillet12
    fillet12_edges = [part.edges().sort_by_distance(p)[0] for p in [
        (200, 10, -402.25),
    ]]
    fillet(fillet12_edges, radius=FILLET12_R)

    # Sketch20 → Boss-Extrude9 (add)
    with BuildSketch(Plane(origin=(0, 20, 0), x_dir=(1, 0, 0), z_dir=(0, 1, 0)).offset(BOSS_EXTRUDE9_START)):
        with BuildLine():
            ThreePointArc((74.841300691, 386.566045157), (85.866952215, 398.032565376), (101.205117772, 402.25))
            Line((101.205117772, 402.25), (81.601215135, 402.25))
            Line((81.601215135, 402.25), (72.585686906, 382.412203187))
            ThreePointArc((72.585686906, 382.412203187), (73.533720954, 384.316045157), (74.614259042, 386.147934958))
            Line((74.614259042, 386.147934958), (74.841300691, 386.566045157))
        make_face()
        Polygon((103.016755999, 402.25), (129.316768109, 402.25), (129.316768109, 412.25), (86.145836856, 412.25), (81.601215135, 402.25), (101.205117772, 402.25), align=None)
        Polygon((185, 402.25), (200, 402.25), (200, 412.25), (129.316768109, 412.25), (129.316768109, 402.25), align=None)
        with BuildLine():
            Line((200, 387.25), (200, 402.25))
            Line((200, 402.25), (185, 402.25))
            ThreePointArc((185, 402.25), (195.606601718, 397.856601718), (200, 387.25))
        make_face()
    extrude(amount=BOSS_EXTRUDE9_DEPTH)

    # Fillet13
    fillet13_edges = [part.edges().sort_by_distance(p)[0] for p in [
        (86.145836856, 10, -412.25),
    ]]
    fillet(fillet13_edges, radius=FILLET13_R)

    # Fillet14
    fillet14_edges = [part.edges().sort_by_distance(p)[0] for p in [
        (200, 10, -412.25),
    ]]
    fillet(fillet14_edges, radius=FILLET14_R)

    # Sketch21 → Boss-Extrude10 (add, through all)
    with BuildSketch(Plane(origin=(0, 20, 0), x_dir=(1, 0, 0), z_dir=(0, 1, 0))):
        with Locations((125, 324)):
            Circle(SKETCH21_R)
    extrude(amount=-BOSS_EXTRUDE10_DEPTH)


solid = part.part
